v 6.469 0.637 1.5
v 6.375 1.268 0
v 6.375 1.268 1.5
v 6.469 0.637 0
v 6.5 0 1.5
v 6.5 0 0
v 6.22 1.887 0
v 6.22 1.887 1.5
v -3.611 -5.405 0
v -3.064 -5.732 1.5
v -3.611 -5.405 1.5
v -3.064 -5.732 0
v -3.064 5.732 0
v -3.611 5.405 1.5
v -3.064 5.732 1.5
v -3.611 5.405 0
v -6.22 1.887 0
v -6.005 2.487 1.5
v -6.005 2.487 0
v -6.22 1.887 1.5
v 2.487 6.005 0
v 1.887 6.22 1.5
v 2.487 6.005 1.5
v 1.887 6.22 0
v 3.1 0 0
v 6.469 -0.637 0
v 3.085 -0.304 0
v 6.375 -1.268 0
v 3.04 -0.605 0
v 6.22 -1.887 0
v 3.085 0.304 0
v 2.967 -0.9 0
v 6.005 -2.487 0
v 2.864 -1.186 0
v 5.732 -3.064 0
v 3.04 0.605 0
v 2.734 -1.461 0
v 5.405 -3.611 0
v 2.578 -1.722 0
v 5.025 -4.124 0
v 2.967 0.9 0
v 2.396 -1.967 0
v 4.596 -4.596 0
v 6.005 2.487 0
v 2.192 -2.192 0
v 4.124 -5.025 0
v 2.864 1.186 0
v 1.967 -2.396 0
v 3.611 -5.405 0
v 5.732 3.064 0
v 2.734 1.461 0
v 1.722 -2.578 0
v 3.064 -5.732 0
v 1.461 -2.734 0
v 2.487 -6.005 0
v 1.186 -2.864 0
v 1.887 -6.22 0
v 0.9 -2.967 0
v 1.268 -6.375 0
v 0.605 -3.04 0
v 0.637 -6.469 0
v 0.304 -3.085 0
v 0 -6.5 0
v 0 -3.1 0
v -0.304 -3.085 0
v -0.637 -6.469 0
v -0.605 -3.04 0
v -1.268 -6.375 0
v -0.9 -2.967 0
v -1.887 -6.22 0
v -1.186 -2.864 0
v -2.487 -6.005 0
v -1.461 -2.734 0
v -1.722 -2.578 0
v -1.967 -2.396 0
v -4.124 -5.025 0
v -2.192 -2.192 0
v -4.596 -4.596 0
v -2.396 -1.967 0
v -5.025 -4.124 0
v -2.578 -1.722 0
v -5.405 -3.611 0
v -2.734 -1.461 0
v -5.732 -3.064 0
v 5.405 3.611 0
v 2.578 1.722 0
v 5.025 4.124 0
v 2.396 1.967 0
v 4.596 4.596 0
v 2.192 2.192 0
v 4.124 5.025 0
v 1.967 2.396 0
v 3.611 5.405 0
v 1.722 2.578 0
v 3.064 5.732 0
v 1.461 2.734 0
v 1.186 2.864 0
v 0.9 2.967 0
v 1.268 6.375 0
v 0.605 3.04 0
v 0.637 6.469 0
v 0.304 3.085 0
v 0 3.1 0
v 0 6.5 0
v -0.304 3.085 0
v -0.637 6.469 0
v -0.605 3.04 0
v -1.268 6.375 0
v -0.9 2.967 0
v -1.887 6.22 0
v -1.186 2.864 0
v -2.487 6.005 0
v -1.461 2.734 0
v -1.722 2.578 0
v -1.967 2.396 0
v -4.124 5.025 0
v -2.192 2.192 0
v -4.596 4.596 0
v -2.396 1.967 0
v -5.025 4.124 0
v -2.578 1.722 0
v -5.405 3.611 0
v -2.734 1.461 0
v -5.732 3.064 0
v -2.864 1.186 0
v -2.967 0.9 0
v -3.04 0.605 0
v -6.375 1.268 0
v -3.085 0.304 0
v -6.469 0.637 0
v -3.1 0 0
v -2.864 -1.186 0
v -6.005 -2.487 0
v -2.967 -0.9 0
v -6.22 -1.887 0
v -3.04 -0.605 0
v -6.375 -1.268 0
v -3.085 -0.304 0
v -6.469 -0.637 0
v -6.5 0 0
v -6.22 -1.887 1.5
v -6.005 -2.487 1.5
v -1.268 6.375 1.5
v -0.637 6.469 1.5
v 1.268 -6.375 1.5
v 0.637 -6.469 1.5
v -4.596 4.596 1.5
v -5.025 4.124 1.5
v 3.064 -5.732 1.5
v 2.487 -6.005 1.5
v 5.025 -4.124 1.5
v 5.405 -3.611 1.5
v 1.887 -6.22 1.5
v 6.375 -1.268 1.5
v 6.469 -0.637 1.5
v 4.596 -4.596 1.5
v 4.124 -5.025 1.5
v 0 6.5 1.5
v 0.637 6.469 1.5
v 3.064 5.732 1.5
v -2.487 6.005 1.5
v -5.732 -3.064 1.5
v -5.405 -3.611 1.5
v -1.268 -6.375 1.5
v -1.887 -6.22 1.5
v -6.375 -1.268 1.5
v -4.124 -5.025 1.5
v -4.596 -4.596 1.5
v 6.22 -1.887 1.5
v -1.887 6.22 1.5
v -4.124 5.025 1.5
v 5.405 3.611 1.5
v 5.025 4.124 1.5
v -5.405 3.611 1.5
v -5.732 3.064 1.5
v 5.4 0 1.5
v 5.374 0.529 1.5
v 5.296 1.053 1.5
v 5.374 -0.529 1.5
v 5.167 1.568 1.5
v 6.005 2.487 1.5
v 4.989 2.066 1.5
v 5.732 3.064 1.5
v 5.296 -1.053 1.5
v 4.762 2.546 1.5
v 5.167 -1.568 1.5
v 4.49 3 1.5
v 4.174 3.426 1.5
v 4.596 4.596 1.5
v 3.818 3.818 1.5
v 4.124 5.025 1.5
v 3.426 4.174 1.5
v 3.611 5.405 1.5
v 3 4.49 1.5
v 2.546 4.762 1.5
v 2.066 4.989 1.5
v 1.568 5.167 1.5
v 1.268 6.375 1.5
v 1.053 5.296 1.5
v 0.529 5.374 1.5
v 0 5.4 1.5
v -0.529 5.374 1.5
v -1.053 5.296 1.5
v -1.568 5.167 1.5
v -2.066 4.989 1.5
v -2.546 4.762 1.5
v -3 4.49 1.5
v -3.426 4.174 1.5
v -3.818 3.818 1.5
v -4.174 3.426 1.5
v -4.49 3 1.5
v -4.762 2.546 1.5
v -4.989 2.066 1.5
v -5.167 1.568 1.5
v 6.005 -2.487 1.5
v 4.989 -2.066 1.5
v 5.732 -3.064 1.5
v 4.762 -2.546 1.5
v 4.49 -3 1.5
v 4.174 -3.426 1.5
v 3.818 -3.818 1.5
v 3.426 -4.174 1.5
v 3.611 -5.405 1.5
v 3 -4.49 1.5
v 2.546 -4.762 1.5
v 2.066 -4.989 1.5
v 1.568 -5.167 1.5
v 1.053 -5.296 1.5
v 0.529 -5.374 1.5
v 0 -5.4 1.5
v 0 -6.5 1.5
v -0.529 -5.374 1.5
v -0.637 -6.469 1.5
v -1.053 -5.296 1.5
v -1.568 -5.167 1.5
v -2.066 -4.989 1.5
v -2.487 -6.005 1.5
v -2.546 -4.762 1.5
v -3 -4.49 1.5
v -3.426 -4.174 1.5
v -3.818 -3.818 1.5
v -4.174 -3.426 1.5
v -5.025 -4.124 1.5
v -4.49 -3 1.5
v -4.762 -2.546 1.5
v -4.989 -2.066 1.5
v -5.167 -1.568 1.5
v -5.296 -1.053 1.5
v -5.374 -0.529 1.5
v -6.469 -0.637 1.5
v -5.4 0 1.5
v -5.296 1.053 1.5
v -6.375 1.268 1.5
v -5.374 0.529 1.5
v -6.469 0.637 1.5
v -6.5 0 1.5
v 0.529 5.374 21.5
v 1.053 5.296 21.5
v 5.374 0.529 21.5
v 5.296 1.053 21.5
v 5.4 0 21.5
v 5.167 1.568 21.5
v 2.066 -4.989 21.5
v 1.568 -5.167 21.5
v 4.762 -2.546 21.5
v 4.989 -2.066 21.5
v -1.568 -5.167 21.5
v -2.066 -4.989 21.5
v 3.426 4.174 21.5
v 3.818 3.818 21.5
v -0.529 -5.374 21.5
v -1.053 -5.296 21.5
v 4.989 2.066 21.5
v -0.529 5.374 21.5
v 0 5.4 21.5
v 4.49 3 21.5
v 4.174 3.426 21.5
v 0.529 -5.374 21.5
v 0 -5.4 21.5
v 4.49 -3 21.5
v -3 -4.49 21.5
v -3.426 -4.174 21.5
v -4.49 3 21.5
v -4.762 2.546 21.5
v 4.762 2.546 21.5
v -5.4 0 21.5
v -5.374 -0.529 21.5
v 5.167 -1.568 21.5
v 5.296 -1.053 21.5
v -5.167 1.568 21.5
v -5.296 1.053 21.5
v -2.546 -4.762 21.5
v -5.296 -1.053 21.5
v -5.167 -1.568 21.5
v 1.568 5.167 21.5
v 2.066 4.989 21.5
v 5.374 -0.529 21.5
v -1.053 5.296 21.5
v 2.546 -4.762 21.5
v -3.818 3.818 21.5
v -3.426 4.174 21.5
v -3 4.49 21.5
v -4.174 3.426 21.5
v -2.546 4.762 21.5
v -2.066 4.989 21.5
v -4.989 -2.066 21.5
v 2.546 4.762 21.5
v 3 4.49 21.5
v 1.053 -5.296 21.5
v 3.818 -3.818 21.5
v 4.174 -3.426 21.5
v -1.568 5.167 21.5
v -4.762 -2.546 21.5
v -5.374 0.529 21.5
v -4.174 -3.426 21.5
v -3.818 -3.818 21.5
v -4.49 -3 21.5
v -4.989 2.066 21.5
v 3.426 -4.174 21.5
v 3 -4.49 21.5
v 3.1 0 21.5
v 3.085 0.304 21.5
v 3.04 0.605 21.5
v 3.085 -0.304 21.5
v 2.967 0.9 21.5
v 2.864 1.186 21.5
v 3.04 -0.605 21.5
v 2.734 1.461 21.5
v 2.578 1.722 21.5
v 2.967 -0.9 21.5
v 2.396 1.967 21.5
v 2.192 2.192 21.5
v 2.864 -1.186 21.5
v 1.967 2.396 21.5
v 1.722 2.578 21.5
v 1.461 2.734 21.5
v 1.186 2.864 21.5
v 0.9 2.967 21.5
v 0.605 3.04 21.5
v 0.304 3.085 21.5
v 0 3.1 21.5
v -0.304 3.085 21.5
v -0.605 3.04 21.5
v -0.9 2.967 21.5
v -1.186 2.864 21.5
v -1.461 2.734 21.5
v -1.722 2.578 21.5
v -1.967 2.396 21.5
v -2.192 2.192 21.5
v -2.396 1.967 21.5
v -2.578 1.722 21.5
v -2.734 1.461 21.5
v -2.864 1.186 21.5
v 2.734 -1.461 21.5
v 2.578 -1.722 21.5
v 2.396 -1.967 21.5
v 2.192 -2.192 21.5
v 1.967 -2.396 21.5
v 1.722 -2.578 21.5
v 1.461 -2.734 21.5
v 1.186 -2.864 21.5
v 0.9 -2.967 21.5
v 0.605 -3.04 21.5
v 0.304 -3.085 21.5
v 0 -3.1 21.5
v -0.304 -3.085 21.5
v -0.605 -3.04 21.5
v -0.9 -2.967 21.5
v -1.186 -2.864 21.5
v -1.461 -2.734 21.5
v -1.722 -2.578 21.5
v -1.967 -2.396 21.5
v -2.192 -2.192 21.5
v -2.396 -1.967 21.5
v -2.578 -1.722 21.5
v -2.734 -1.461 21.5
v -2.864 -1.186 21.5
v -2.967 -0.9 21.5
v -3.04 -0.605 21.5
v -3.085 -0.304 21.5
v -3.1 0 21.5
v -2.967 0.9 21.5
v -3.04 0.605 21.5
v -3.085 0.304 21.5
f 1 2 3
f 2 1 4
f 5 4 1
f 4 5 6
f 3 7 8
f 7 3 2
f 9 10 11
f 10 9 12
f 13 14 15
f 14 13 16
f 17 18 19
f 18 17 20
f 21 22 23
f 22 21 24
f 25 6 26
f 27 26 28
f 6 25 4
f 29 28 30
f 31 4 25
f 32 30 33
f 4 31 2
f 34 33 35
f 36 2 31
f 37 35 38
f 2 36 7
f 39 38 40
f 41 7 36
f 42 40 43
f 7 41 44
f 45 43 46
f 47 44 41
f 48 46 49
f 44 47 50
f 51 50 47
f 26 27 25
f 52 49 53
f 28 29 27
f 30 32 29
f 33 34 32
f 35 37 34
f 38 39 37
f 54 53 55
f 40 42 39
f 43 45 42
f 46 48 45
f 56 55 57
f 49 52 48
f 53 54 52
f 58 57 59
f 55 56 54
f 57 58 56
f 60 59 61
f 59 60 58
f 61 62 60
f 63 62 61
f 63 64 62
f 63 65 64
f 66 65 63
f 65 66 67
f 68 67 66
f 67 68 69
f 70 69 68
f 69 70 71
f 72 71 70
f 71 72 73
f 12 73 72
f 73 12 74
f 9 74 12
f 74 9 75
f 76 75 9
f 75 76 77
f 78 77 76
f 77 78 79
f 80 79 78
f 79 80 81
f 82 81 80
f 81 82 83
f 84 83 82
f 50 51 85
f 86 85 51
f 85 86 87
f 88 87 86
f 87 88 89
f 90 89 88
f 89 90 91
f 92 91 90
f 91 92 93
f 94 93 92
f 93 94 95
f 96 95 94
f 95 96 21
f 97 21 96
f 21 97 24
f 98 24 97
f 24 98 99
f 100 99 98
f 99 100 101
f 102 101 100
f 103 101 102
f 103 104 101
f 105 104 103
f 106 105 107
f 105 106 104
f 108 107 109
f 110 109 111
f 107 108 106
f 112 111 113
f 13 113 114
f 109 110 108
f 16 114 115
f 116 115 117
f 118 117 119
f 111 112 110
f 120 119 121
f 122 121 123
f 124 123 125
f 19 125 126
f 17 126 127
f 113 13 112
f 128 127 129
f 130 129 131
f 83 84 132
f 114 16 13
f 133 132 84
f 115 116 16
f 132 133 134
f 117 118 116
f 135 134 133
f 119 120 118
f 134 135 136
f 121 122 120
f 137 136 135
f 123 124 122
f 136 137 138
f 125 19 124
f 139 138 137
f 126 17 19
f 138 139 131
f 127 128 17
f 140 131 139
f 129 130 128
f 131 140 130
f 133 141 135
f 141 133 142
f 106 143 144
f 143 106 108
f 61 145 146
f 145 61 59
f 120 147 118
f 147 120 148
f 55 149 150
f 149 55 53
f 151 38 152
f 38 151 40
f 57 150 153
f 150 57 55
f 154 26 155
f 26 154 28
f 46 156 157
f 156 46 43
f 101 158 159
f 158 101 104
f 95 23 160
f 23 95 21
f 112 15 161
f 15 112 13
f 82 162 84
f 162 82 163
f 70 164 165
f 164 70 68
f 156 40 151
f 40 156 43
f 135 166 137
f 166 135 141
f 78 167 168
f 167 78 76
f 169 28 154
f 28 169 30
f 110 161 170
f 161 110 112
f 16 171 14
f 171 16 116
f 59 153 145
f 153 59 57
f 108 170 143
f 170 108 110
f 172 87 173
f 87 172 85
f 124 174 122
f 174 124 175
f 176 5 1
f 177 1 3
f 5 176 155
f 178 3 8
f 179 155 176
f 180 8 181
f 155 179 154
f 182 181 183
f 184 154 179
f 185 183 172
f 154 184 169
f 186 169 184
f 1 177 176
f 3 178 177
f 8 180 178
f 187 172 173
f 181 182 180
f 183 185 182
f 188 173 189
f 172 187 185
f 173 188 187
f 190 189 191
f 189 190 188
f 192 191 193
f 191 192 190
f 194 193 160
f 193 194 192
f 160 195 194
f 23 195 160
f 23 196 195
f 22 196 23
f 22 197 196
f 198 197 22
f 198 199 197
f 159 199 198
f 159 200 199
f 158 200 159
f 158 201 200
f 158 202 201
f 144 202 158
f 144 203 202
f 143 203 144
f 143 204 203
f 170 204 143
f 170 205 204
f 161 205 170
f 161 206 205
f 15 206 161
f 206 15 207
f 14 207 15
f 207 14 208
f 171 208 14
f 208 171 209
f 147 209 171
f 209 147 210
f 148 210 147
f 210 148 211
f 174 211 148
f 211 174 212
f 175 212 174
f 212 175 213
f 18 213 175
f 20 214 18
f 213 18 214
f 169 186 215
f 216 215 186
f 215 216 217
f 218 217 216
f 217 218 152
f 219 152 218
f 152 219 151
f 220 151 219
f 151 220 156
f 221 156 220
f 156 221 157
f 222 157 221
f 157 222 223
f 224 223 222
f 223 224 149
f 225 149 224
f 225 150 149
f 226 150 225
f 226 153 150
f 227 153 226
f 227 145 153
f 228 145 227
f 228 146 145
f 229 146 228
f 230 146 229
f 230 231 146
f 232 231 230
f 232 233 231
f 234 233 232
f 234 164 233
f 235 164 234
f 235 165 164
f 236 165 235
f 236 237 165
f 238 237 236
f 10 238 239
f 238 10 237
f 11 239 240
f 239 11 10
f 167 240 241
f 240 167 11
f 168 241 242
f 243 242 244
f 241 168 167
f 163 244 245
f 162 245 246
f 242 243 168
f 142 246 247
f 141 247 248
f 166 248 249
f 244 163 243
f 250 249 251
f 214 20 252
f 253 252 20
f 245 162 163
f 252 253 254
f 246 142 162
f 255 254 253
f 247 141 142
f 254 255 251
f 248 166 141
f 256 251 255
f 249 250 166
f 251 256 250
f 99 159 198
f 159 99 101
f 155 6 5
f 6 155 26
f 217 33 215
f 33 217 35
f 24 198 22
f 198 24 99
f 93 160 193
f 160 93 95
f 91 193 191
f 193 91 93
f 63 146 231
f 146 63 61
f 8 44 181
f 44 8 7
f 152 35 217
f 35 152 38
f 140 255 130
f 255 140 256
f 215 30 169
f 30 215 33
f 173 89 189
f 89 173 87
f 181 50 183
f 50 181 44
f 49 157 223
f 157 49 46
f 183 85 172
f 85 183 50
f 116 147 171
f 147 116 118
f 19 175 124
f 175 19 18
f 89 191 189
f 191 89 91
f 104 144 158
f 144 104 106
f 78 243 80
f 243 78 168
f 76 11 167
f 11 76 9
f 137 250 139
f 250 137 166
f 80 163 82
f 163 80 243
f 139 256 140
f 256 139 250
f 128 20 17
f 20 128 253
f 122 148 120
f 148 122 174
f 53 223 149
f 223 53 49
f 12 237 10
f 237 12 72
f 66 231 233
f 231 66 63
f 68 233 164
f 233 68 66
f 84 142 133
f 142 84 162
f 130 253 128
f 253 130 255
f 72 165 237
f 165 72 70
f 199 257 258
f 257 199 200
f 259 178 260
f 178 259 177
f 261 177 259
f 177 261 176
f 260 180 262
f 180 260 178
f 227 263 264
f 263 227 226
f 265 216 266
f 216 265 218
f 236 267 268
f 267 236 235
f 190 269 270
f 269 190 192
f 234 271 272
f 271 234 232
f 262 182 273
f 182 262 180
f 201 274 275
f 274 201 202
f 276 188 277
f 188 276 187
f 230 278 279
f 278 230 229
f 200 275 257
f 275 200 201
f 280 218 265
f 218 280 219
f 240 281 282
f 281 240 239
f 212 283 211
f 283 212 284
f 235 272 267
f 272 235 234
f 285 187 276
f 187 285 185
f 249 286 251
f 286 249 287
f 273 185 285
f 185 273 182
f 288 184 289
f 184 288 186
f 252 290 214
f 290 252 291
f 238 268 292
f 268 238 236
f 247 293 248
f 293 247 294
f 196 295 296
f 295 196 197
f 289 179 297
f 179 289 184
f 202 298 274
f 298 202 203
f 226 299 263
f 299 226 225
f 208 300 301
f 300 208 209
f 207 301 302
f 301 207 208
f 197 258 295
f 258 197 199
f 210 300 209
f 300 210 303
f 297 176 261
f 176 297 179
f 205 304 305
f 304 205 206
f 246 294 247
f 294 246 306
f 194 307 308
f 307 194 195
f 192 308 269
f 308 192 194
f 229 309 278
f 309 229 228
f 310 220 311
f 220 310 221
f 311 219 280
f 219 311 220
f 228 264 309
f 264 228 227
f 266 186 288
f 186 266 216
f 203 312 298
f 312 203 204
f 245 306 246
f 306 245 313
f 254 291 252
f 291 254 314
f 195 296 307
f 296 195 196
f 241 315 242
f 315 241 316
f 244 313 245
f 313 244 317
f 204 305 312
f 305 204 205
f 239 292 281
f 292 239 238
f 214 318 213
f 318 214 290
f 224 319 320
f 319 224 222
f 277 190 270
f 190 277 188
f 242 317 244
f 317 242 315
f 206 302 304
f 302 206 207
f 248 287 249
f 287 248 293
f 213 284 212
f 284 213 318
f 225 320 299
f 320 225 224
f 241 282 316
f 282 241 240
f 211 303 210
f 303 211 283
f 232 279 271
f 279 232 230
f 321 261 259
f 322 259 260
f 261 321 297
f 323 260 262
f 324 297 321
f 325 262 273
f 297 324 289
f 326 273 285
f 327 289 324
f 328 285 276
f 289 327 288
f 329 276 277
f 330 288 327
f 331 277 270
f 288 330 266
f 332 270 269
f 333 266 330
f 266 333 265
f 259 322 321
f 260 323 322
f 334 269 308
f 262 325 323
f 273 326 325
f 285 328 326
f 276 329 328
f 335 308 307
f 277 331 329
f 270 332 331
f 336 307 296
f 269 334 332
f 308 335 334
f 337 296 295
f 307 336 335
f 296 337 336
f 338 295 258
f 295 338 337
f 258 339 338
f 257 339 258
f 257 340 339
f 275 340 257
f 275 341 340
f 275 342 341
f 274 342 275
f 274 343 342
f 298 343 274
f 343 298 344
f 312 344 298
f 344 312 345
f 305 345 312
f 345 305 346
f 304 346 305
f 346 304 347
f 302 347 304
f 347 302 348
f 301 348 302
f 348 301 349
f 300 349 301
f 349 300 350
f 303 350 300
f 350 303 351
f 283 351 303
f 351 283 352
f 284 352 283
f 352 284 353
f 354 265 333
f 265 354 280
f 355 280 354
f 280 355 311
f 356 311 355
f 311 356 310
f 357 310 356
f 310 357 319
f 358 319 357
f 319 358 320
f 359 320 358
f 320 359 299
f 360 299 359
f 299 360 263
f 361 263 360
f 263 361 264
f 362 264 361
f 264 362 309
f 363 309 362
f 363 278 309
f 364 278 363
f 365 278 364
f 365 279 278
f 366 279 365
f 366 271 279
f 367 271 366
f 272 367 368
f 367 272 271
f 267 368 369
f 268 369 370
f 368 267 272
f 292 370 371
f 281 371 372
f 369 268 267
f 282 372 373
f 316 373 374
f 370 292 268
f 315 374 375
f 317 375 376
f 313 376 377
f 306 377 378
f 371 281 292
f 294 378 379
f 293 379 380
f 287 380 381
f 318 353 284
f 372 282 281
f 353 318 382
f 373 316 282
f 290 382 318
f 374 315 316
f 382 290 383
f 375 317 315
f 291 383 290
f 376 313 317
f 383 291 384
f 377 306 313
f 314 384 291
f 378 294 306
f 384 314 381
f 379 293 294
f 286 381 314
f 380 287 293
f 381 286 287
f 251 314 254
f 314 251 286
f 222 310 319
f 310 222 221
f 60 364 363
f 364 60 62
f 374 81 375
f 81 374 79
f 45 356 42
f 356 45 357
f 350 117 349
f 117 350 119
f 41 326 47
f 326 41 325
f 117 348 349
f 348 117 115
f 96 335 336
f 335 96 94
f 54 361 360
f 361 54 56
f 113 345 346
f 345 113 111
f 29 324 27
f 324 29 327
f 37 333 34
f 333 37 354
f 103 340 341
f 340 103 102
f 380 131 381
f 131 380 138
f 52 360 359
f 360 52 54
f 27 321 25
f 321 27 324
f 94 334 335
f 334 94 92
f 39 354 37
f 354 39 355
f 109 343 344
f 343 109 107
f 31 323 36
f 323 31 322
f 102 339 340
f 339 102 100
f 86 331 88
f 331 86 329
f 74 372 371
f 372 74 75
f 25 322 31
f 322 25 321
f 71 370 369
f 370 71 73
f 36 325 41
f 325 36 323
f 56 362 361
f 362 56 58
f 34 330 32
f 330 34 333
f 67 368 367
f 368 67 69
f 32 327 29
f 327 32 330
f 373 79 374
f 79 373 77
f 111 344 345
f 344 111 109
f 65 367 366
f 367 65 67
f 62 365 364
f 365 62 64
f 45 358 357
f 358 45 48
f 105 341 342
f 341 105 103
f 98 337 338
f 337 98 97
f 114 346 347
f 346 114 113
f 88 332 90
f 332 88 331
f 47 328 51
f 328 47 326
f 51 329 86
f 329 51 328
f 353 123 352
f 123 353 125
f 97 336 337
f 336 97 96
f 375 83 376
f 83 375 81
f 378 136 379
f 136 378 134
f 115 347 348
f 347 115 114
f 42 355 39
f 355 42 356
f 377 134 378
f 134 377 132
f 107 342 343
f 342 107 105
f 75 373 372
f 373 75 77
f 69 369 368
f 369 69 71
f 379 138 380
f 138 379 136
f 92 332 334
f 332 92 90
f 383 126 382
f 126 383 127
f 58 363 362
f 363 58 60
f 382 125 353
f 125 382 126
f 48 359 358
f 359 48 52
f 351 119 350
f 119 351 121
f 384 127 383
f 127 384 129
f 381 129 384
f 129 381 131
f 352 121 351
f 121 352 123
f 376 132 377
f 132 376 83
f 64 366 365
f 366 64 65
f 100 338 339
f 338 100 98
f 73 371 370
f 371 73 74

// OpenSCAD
// Adapter sleeve: 0.2 mL PCR tube for 1.5 mL tube rack
// Print orientation: collar down on the bed (z = 0), sleeve up (+Z)

$fn = 64;

// ---- Dimensions (mm) ----
collar_d      = 13;    // collar outer diameter
collar_h      = 1.5;   // collar thickness (z = 0 to 1.5)
sleeve_od     = 10.8;  // sleeve body outer diameter
sleeve_top_z  = 21.5;  // top of sleeve body
bore_d        = 6.2;   // through-bore diameter
eps           = 0.5;   // cutter overshoot past faces

// ---- Model ----
difference() {
    union() {
        // Collar
        cylinder(d = collar_d, h = collar_h);
        // Sleeve body (slightly overlapping collar for a clean union)
        translate([0, 0, collar_h - 0.01])
            cylinder(d = sleeve_od, h = sleeve_top_z - collar_h + 0.01);
    }
    // Full-height through-bore
    translate([0, 0, -eps])
        cylinder(d = bore_d, h = sleeve_top_z + 2 * eps);
}
